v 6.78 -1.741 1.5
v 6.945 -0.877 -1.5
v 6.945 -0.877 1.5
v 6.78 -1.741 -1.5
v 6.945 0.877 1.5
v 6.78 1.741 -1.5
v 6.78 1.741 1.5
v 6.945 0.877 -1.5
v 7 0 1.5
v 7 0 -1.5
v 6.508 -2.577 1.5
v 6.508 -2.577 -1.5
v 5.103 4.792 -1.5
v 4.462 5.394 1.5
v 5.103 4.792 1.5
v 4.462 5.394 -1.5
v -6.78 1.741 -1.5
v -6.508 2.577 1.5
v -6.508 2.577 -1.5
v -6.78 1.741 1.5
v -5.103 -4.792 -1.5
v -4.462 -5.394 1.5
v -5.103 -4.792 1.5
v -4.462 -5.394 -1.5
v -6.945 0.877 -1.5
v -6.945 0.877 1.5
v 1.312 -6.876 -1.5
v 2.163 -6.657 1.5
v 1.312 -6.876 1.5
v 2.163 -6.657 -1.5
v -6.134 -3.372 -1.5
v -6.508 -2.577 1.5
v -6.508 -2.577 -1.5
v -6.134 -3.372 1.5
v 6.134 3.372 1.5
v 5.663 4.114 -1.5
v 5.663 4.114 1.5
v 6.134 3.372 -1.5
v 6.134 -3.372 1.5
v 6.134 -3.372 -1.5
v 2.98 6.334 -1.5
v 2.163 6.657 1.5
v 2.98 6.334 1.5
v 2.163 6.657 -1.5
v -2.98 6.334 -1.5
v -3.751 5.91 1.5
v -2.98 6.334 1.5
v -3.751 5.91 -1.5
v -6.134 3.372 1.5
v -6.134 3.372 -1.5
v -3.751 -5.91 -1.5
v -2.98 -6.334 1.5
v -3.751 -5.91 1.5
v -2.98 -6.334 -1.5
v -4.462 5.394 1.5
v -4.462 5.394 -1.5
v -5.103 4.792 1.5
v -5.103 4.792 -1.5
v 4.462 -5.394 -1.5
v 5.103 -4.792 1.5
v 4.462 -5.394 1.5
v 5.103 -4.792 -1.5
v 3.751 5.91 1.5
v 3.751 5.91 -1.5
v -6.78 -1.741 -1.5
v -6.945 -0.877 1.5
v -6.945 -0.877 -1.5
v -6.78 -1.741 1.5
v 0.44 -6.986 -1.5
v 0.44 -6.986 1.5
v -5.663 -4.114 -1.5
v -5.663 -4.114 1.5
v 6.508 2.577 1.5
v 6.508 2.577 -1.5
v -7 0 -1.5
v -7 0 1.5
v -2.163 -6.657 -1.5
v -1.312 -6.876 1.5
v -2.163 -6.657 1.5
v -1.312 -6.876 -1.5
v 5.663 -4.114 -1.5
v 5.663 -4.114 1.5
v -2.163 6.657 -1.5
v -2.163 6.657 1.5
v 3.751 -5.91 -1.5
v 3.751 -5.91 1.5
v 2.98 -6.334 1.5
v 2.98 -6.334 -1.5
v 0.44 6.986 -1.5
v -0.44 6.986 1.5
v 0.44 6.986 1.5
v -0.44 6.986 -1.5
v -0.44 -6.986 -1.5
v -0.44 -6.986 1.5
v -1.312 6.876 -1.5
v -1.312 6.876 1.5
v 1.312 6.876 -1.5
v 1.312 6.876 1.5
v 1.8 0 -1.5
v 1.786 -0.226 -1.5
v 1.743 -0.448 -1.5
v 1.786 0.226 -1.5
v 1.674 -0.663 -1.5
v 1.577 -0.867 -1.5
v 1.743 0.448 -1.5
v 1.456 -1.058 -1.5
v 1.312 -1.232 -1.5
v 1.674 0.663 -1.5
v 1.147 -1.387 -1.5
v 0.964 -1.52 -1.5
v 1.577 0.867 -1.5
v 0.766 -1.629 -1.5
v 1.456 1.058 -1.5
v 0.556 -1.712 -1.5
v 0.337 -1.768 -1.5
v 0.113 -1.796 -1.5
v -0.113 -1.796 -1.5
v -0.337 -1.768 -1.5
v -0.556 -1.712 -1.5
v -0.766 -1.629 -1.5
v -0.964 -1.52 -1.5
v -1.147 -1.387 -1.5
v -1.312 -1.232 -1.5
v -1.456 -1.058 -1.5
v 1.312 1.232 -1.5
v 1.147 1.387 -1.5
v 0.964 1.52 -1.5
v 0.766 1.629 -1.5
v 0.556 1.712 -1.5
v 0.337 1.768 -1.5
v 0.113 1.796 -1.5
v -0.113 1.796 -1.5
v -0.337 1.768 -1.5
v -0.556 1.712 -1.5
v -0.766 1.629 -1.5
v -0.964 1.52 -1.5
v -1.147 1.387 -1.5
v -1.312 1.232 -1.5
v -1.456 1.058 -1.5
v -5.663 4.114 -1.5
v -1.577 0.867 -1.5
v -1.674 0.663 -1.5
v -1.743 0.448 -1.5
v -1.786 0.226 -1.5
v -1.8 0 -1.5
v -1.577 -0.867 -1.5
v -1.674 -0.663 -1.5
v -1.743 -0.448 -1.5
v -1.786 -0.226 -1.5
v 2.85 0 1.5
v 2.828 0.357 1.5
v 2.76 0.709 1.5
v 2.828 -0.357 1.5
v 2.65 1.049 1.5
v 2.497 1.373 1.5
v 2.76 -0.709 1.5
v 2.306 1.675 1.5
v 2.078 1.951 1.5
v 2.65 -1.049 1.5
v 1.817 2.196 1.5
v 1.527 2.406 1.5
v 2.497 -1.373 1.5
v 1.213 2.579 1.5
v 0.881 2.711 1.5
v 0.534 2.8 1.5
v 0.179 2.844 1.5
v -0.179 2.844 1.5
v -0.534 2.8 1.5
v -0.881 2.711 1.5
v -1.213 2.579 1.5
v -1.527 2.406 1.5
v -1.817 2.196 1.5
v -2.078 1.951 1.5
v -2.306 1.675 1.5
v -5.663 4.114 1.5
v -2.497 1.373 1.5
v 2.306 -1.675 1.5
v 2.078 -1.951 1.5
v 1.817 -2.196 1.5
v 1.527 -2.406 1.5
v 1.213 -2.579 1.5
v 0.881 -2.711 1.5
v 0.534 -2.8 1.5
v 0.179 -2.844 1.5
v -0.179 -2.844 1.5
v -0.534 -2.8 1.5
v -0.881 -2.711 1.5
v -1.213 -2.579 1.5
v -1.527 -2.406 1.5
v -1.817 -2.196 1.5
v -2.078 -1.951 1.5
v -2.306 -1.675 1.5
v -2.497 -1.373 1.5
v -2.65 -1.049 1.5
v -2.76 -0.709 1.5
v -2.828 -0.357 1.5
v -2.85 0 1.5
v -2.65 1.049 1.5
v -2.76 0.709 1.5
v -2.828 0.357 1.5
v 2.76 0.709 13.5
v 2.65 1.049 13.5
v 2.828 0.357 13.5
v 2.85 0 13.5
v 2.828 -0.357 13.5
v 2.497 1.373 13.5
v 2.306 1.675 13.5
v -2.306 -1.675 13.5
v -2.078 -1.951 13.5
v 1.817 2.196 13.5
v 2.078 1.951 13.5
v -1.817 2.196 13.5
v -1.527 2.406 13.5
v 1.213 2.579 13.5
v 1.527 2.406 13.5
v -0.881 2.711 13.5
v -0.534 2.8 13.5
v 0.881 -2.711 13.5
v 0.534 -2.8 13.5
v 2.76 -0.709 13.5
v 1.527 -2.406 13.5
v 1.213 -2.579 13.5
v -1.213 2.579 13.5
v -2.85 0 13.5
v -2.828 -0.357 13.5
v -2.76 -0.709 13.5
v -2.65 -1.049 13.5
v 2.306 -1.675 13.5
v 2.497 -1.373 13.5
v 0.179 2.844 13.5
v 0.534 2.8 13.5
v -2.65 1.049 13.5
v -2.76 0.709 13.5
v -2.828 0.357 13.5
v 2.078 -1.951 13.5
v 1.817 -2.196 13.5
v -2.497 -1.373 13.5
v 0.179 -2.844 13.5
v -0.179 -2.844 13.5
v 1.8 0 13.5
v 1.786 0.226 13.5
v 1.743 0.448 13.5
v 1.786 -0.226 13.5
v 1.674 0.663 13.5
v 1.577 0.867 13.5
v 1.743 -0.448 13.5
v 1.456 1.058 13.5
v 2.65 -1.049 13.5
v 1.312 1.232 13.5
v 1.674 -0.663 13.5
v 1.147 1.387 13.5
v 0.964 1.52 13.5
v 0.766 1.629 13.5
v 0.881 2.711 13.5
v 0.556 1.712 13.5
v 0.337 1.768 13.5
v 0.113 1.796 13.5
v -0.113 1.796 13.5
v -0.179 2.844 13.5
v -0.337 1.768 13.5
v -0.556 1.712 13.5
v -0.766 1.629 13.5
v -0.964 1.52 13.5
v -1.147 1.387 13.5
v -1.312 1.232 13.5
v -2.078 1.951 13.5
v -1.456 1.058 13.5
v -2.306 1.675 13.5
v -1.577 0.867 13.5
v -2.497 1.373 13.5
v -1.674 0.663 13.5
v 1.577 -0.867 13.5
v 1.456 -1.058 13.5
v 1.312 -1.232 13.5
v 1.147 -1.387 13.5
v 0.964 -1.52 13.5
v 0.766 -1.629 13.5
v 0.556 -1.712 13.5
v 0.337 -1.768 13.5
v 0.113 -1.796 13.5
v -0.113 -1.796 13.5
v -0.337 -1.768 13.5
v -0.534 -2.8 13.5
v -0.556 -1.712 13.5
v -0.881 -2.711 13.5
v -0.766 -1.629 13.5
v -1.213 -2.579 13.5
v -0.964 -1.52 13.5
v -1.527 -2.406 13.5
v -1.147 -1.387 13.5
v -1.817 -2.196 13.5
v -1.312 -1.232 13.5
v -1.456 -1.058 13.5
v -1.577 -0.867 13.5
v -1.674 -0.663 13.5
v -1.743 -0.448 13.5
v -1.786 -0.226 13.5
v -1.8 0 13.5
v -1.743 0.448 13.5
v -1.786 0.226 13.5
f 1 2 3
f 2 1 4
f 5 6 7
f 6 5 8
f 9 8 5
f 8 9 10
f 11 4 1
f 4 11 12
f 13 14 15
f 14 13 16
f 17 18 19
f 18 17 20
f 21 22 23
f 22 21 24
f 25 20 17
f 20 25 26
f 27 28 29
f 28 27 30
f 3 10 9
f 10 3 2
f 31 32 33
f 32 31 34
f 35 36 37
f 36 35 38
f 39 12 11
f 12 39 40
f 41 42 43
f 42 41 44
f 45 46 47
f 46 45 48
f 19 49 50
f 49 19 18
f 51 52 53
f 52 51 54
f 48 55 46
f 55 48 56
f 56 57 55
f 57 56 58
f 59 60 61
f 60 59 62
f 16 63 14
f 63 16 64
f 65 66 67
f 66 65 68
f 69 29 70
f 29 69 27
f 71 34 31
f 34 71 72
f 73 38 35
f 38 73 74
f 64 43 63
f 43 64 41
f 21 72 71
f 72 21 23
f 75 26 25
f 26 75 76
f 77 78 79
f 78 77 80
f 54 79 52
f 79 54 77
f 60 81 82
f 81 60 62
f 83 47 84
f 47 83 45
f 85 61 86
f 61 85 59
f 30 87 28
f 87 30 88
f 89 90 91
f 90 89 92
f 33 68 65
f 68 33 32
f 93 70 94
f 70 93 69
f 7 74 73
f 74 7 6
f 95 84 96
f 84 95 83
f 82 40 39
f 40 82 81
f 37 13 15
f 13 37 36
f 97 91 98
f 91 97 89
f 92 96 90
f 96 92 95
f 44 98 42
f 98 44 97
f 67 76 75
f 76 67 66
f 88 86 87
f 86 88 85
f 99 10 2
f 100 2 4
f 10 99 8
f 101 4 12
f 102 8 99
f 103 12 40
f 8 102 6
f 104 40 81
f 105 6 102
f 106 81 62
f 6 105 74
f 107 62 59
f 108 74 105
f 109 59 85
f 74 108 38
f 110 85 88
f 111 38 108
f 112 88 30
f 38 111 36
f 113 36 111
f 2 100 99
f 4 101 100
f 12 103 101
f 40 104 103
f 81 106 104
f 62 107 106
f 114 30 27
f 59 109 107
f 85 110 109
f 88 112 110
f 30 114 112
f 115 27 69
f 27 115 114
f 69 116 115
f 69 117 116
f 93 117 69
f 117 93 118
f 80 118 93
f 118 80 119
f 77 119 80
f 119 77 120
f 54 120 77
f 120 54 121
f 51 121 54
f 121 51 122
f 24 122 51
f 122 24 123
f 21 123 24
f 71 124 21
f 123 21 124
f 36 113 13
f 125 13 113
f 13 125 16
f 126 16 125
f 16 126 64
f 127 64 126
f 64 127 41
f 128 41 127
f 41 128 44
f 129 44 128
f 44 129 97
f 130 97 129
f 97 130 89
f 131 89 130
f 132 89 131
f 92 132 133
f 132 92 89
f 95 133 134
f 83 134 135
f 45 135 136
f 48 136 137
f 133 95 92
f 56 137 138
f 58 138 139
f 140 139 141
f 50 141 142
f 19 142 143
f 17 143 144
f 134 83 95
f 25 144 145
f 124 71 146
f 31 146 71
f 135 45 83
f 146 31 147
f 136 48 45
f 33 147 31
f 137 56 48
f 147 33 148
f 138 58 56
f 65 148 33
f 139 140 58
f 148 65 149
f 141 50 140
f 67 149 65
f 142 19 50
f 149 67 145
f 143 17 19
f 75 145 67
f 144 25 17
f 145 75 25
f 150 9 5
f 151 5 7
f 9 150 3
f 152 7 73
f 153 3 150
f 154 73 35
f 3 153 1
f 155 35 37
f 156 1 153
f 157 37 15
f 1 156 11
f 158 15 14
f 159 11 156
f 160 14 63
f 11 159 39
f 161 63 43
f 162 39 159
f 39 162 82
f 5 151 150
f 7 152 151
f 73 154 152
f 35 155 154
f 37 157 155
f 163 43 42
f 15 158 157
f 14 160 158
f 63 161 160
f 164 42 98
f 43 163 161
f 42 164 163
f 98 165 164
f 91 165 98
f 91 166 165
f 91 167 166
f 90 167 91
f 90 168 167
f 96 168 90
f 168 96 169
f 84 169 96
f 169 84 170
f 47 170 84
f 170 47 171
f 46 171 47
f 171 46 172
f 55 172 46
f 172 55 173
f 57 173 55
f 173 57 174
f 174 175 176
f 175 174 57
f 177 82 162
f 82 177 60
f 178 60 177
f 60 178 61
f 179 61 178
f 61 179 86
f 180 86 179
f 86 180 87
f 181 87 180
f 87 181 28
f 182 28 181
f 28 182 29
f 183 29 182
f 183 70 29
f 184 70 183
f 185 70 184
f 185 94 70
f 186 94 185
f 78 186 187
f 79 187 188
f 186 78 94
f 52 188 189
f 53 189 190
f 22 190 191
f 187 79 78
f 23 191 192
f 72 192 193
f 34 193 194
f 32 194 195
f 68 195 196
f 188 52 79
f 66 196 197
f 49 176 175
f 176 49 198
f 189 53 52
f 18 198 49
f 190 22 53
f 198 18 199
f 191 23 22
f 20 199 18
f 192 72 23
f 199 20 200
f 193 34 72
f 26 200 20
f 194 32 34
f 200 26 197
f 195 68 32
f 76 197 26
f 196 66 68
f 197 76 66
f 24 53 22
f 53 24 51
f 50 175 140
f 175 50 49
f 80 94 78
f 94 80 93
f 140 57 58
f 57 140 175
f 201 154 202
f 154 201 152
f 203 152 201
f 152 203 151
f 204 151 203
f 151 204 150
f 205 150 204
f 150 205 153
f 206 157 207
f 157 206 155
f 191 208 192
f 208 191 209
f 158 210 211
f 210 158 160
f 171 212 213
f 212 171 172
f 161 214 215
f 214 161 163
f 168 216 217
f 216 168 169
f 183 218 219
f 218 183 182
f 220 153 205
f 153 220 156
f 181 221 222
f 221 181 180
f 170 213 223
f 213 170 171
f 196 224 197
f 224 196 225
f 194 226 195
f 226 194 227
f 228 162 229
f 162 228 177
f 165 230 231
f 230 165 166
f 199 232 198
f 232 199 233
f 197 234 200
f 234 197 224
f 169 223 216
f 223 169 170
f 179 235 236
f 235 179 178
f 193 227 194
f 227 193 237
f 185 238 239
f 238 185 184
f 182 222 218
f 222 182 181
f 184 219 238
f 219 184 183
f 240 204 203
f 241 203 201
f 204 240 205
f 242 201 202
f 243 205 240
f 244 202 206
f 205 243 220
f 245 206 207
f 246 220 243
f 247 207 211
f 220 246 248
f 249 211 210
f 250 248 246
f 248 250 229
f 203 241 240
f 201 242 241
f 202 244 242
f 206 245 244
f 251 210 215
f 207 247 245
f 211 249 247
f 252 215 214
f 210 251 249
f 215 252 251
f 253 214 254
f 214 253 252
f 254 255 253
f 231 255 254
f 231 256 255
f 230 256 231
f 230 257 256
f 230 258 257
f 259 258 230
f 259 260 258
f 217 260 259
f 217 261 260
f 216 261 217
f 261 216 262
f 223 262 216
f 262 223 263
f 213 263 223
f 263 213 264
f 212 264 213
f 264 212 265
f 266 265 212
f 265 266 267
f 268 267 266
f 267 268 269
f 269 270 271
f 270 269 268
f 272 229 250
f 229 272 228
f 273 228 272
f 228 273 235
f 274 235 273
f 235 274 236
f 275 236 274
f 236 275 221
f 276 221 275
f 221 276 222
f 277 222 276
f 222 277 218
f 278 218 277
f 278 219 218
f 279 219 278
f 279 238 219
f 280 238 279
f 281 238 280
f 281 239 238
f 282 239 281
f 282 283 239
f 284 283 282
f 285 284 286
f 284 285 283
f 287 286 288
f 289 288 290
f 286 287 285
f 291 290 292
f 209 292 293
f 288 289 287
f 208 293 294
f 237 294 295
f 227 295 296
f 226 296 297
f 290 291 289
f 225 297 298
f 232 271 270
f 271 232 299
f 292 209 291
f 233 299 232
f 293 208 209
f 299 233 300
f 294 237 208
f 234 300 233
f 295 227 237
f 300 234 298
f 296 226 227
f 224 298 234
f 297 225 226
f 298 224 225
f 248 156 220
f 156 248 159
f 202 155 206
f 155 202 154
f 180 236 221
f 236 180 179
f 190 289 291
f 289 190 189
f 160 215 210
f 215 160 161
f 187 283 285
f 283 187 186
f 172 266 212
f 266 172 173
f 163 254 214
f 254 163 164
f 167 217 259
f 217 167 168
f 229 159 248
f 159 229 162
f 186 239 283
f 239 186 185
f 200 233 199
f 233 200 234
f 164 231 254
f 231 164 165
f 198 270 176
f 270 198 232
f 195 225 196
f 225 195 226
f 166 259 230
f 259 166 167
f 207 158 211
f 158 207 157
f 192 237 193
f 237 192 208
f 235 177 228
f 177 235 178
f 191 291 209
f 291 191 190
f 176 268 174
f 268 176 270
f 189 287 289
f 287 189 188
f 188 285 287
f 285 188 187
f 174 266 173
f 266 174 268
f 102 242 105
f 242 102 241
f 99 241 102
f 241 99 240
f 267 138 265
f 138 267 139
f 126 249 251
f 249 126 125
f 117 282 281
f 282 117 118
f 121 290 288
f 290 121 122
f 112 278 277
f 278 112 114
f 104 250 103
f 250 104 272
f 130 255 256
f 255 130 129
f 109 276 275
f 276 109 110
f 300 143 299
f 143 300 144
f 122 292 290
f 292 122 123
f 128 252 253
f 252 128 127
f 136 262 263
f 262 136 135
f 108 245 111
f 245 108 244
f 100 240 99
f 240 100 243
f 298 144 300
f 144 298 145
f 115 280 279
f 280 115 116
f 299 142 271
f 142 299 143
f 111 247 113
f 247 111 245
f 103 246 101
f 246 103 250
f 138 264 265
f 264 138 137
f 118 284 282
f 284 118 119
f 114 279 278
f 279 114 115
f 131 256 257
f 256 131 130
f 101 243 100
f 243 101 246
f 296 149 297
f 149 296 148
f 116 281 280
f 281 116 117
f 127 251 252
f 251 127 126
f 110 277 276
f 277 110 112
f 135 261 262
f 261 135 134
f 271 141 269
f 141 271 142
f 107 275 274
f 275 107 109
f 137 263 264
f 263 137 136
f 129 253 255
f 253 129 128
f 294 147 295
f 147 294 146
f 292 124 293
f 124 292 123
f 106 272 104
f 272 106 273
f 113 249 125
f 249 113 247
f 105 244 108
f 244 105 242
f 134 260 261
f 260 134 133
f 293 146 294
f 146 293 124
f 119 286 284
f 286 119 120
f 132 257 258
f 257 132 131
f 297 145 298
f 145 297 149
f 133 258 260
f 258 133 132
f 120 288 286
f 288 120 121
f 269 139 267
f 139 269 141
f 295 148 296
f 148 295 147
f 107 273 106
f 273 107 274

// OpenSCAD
$fn = 50;


difference() {
	union() {
		translate(v = [0, 0, -1.5000000000]) {
			cylinder(h = 3, r = 7.0000000000);
		}
		translate(v = [0, 0, -1.5000000000]) {
			cylinder(h = 15, r = 2.8500000000);
		}
	}
	union() {
		translate(v = [0, 0, -100.0000000000]) {
			cylinder(h = 200, r = 1.8000000000);
		}
	}
}
